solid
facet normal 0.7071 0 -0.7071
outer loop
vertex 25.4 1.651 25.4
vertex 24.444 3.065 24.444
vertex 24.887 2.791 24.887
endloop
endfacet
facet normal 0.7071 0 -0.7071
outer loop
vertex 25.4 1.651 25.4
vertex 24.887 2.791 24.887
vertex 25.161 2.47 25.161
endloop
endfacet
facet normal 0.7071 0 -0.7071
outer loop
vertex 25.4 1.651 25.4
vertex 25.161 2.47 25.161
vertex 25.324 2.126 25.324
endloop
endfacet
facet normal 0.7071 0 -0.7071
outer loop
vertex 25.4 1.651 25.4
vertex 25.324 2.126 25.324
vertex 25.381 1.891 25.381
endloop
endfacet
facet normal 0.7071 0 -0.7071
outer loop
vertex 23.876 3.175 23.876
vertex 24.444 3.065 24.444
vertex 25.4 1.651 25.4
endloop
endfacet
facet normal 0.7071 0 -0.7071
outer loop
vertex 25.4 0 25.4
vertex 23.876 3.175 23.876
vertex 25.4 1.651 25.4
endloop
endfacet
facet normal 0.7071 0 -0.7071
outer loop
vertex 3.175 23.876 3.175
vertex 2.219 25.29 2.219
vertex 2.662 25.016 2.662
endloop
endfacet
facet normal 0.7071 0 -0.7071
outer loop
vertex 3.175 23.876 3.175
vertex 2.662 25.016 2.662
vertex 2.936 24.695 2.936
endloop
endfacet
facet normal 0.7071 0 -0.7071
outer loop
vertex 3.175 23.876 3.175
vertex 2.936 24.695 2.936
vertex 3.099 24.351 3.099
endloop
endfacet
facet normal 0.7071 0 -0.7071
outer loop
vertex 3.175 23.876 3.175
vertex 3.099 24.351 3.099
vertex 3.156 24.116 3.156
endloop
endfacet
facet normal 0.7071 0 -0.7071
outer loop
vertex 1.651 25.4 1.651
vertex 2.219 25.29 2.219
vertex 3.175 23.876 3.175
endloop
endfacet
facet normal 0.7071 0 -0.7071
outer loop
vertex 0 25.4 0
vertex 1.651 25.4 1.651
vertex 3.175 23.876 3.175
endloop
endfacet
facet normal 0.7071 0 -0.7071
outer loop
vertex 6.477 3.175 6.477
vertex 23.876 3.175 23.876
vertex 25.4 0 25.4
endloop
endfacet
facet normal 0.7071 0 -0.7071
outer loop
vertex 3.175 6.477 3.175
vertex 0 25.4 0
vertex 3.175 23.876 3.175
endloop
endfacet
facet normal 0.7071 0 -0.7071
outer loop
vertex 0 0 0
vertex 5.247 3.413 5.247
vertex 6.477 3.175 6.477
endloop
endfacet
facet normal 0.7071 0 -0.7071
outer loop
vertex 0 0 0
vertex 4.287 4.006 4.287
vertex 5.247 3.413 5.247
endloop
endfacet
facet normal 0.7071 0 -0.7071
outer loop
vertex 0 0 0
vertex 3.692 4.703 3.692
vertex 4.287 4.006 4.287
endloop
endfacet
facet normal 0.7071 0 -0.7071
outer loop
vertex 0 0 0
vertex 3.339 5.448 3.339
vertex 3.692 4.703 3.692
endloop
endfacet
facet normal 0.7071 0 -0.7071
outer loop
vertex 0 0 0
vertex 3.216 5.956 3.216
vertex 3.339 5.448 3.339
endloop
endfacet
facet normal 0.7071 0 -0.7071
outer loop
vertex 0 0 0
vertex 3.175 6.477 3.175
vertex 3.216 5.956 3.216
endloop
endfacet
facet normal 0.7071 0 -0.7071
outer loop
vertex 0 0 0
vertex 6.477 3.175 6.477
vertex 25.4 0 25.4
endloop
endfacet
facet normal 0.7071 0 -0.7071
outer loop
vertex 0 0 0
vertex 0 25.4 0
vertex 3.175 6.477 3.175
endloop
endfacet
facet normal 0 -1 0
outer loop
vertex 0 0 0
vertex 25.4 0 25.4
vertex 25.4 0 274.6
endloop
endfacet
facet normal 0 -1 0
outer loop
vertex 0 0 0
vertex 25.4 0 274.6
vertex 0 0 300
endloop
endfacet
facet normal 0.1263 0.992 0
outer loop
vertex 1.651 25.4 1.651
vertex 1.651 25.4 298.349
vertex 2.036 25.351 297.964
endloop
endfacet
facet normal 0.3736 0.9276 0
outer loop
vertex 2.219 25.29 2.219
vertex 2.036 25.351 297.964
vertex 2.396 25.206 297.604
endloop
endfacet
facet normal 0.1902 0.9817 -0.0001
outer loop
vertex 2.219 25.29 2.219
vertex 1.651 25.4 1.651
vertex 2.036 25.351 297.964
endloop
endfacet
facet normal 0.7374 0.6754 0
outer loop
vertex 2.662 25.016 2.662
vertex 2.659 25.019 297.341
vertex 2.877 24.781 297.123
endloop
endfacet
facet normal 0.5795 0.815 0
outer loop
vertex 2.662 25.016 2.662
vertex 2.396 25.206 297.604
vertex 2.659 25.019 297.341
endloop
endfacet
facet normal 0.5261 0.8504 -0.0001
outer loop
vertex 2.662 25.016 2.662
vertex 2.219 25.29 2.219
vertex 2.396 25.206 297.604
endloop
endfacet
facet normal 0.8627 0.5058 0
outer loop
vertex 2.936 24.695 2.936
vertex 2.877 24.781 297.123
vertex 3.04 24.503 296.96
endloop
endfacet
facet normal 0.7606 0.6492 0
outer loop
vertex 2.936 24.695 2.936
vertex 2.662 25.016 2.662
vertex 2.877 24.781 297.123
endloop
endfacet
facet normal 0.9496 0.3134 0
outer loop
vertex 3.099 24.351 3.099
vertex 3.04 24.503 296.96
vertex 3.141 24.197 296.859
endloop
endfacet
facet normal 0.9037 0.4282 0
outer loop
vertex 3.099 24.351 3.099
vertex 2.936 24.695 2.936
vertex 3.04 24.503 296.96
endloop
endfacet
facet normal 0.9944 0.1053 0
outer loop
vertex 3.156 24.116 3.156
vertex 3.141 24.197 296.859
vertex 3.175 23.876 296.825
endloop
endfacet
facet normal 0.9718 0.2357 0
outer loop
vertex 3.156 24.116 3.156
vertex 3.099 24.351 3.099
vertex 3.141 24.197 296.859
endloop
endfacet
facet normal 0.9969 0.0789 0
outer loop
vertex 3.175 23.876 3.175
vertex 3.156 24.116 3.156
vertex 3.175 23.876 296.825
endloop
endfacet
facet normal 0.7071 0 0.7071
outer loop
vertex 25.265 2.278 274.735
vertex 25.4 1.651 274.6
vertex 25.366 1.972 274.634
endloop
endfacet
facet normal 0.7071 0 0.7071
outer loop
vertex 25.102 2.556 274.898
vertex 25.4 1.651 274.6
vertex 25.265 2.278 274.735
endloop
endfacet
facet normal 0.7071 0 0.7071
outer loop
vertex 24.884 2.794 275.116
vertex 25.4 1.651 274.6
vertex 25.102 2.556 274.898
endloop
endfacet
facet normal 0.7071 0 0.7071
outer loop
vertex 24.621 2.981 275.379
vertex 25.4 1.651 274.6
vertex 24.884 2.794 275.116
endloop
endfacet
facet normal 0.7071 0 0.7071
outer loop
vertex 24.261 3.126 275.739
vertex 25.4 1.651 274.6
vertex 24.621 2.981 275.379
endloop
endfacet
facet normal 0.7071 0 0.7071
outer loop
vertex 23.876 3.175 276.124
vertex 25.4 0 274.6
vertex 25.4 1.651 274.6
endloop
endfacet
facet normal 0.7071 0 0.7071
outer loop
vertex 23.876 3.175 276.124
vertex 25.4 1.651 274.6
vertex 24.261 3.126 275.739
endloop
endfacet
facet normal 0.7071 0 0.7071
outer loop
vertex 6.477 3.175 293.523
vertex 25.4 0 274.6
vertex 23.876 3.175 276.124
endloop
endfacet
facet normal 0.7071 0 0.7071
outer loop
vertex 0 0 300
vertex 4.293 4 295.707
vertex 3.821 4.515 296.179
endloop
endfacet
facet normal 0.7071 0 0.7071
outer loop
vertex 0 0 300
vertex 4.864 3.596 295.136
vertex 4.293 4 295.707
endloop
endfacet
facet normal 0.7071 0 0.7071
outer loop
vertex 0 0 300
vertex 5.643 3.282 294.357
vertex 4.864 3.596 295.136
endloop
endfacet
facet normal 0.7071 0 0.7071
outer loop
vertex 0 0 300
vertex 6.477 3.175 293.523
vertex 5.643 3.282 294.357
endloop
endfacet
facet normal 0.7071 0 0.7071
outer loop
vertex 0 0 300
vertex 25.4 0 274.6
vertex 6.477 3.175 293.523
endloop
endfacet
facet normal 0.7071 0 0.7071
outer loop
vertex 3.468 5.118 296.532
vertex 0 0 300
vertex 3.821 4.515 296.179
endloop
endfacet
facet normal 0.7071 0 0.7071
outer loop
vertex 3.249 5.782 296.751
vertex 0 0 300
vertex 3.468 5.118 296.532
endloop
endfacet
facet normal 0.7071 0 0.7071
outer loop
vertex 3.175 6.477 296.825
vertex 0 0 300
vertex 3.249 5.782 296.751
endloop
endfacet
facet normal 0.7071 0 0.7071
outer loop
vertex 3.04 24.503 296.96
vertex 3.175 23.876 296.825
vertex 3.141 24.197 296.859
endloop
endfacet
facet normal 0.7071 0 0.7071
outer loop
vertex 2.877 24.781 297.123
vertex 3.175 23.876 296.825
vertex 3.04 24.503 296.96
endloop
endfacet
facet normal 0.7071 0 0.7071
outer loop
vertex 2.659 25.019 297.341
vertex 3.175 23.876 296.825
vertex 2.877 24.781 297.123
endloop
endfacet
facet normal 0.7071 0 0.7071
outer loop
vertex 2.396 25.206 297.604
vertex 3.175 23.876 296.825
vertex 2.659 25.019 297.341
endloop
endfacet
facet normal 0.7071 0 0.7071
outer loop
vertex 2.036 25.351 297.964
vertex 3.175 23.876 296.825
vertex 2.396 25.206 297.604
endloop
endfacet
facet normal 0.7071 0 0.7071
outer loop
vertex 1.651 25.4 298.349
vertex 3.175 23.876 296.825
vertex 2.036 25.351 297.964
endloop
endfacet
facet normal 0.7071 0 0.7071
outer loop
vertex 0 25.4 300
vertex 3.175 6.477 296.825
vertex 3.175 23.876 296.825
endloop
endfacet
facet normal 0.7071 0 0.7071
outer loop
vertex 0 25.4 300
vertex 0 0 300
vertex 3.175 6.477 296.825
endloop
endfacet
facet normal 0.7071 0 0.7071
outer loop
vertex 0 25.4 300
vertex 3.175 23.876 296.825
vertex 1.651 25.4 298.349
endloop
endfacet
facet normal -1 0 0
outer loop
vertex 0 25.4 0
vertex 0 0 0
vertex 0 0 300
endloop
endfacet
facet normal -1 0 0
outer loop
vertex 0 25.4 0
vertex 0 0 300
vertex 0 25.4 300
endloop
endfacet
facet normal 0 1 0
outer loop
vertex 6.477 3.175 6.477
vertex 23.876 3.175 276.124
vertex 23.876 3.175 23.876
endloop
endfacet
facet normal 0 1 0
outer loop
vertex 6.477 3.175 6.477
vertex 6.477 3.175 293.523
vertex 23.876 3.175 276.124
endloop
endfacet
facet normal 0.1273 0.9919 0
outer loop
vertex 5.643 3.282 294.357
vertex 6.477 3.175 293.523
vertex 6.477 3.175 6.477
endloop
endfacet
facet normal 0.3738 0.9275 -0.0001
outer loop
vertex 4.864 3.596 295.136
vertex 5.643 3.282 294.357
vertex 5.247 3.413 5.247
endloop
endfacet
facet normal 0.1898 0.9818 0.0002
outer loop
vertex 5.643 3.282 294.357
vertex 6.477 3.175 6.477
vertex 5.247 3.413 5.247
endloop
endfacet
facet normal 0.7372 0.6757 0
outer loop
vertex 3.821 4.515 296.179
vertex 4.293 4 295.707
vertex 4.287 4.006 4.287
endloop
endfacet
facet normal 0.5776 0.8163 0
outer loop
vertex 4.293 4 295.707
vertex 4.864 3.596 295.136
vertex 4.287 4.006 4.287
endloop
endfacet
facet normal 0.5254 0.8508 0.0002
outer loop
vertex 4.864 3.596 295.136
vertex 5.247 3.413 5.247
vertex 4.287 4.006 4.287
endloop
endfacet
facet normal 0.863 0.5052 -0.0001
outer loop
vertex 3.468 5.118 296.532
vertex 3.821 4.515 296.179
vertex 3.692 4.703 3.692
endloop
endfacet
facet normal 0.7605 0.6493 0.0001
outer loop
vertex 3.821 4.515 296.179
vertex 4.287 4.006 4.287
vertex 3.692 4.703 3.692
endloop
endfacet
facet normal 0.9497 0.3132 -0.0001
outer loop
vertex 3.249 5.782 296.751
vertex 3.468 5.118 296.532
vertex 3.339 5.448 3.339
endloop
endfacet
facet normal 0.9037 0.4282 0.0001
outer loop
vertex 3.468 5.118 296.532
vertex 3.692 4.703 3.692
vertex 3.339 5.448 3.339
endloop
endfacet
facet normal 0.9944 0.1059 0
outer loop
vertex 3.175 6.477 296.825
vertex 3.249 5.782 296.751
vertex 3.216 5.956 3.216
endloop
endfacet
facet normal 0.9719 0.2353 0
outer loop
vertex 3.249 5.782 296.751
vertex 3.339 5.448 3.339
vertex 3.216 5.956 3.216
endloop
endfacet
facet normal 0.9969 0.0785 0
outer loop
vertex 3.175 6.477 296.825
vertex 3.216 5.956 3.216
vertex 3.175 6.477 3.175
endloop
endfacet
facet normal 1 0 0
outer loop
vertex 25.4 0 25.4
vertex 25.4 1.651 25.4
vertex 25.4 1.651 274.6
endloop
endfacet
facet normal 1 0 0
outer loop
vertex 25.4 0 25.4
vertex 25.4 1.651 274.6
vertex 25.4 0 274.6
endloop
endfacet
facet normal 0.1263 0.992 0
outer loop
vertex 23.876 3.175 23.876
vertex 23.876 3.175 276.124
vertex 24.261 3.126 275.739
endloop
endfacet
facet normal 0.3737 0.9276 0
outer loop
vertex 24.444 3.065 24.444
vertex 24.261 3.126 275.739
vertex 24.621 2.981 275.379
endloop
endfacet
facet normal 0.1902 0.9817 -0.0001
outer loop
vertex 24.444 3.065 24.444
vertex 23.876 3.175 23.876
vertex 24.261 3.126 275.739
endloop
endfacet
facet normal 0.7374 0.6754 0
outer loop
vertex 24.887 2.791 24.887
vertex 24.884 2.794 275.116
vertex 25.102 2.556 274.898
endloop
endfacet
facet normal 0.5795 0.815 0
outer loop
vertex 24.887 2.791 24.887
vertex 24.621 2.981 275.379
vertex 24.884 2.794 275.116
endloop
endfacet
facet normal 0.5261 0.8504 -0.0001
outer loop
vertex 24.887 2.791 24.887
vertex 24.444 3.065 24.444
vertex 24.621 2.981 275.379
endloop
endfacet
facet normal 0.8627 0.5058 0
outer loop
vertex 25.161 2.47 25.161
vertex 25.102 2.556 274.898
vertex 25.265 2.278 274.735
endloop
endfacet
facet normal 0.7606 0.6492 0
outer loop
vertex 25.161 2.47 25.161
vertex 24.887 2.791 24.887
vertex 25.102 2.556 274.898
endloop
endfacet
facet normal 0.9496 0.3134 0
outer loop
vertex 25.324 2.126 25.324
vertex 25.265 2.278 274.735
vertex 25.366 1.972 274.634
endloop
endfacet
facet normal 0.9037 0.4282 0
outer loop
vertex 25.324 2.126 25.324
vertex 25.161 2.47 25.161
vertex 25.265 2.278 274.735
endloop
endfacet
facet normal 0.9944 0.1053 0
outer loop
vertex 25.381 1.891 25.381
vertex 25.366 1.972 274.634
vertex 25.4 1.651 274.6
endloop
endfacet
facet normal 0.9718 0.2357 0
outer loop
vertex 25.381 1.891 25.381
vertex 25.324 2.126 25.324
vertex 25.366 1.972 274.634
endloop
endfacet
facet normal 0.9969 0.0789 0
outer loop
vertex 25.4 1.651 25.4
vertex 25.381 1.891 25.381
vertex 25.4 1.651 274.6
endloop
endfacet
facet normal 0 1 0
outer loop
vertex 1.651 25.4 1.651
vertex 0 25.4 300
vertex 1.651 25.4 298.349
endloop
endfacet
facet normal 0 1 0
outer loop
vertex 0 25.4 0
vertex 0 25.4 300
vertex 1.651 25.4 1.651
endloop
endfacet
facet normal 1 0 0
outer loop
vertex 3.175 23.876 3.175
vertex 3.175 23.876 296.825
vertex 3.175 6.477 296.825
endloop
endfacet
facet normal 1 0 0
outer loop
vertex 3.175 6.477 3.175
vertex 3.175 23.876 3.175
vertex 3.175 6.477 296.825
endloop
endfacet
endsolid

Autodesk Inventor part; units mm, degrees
ref_plane "Start Plane" through (0, 0, 0) normal (0, 0, 1) x (1, 0, 0)
ref_plane "End Plane" through (0, 0, 300) normal (0, 0, 1) x (1, 0, 0)
sketch "Sketch" plane through (0, 0, 0) normal (0, 0, 1) x (1, 0, 0)
  line L0 (25.4, 0) -> (0, 0)
  line L1 (0, 0) -> (0, 25.4)
  line L2 (0, 25.4) -> (1.651, 25.4)
  line L3 (3.175, 23.876) -> (3.175, 6.477)
  line L4 (6.477, 3.175) -> (23.876, 3.175)
  line L5 (25.4, 1.651) -> (25.4, 0)
  line L6 (0, -11.0414) -> (0, 31.5385) construction
  line L7 (-11.0414, 0) -> (31.5385, 0) construction
  arc A0 (3.175, 6.477) -> (6.477, 3.175) centre (6.477, 6.477) ccw
  arc A1 (3.175, 23.876) -> (1.651, 25.4) centre (1.651, 23.876) ccw
  arc A2 (25.4, 1.651) -> (23.876, 3.175) centre (23.876, 1.651) ccw
  line L8 (0, 40.0545) -> (0, -19.5574) construction
  line L9 (-19.5574, 0) -> (40.0545, 0) construction
  point P0 (3.175, 25.4)
  point P1 (3.175, 3.175)
  point P2 (25.4, 3.175)
  dimension "d0" = 25.4
  dimension "d1" = 25.4
  dimension "d2" = 3.175
  dimension "d3" = 3.175
  dimension "d10" = 0
  dimension "d11" = 0
  dimension "d14" = 3.302
  dimension "d15" = 1.524
extrude "Body" add sketch "Sketch" along normal up to surface (300 mm away) from surface at 0
sketch "Sketch3" plane through (0, 0, 0) normal (0, 0, 1) x (1, 0, 0)
  line L0 (0, 0) -> (10, 0)
ref_plane "Work Plane3" through (0, 0, 0) normal (0, -1, 0) x (1, 0, 0)
ref_plane "Work Plane4" through (0, 12.7, 0) normal (0.7071, 0, -0.7071) x (-0.7071, 0, -0.7071)
split "Split1" plane through (0, 12.7, 0) removes the side toward (0.7071, 0, -0.7071)
ref_plane "Work Plane5" through (0, 12.7, 300) normal (0.7071, 0, 0.7071) x (0.7071, 0, -0.7071)
split "Split2" plane through (0, 12.7, 300) removes the side toward (0.7071, 0, 0.7071)
sketch "Sketch4" plane through (0, 0, 0) normal (0, -1, 0) x (1, 0, 0)
  line L0 (-2, 0) -> (12, 0) projected
  line L1 (-2, 300) -> (12, 300) projected
  dimension "d17" = 300
equation "\"d0\" = G_H"
equation "\"d1\" = G_H"
equation "\"d2\" = G_T"
equation "\"d3\" = G_T"
equation "\"d14\" = G_IR"
equation "\"d15\" = G_ER"
equation "\"d4\" = G_L"
equation "\"G_H\" = 25.4"
equation "\"G_T\" = 3.175"
equation "\"G_ER\" = 1.524"
equation "\"G_IR\" = 3.302"
equation "\"G_L\" = d17"
equation "\"ex\" = 0"
equation "\"G_OFFSET_START\" = 0"
equation "\"G_OFFSET_END\" = 0"
equation "\"d13\" = G_OFFSET_END + B_L"
equation "\"B_L\" = 300"
properties part number "AISC - L 1 x 1 x 1/8 - 11.811" material "Steel, Mild"
